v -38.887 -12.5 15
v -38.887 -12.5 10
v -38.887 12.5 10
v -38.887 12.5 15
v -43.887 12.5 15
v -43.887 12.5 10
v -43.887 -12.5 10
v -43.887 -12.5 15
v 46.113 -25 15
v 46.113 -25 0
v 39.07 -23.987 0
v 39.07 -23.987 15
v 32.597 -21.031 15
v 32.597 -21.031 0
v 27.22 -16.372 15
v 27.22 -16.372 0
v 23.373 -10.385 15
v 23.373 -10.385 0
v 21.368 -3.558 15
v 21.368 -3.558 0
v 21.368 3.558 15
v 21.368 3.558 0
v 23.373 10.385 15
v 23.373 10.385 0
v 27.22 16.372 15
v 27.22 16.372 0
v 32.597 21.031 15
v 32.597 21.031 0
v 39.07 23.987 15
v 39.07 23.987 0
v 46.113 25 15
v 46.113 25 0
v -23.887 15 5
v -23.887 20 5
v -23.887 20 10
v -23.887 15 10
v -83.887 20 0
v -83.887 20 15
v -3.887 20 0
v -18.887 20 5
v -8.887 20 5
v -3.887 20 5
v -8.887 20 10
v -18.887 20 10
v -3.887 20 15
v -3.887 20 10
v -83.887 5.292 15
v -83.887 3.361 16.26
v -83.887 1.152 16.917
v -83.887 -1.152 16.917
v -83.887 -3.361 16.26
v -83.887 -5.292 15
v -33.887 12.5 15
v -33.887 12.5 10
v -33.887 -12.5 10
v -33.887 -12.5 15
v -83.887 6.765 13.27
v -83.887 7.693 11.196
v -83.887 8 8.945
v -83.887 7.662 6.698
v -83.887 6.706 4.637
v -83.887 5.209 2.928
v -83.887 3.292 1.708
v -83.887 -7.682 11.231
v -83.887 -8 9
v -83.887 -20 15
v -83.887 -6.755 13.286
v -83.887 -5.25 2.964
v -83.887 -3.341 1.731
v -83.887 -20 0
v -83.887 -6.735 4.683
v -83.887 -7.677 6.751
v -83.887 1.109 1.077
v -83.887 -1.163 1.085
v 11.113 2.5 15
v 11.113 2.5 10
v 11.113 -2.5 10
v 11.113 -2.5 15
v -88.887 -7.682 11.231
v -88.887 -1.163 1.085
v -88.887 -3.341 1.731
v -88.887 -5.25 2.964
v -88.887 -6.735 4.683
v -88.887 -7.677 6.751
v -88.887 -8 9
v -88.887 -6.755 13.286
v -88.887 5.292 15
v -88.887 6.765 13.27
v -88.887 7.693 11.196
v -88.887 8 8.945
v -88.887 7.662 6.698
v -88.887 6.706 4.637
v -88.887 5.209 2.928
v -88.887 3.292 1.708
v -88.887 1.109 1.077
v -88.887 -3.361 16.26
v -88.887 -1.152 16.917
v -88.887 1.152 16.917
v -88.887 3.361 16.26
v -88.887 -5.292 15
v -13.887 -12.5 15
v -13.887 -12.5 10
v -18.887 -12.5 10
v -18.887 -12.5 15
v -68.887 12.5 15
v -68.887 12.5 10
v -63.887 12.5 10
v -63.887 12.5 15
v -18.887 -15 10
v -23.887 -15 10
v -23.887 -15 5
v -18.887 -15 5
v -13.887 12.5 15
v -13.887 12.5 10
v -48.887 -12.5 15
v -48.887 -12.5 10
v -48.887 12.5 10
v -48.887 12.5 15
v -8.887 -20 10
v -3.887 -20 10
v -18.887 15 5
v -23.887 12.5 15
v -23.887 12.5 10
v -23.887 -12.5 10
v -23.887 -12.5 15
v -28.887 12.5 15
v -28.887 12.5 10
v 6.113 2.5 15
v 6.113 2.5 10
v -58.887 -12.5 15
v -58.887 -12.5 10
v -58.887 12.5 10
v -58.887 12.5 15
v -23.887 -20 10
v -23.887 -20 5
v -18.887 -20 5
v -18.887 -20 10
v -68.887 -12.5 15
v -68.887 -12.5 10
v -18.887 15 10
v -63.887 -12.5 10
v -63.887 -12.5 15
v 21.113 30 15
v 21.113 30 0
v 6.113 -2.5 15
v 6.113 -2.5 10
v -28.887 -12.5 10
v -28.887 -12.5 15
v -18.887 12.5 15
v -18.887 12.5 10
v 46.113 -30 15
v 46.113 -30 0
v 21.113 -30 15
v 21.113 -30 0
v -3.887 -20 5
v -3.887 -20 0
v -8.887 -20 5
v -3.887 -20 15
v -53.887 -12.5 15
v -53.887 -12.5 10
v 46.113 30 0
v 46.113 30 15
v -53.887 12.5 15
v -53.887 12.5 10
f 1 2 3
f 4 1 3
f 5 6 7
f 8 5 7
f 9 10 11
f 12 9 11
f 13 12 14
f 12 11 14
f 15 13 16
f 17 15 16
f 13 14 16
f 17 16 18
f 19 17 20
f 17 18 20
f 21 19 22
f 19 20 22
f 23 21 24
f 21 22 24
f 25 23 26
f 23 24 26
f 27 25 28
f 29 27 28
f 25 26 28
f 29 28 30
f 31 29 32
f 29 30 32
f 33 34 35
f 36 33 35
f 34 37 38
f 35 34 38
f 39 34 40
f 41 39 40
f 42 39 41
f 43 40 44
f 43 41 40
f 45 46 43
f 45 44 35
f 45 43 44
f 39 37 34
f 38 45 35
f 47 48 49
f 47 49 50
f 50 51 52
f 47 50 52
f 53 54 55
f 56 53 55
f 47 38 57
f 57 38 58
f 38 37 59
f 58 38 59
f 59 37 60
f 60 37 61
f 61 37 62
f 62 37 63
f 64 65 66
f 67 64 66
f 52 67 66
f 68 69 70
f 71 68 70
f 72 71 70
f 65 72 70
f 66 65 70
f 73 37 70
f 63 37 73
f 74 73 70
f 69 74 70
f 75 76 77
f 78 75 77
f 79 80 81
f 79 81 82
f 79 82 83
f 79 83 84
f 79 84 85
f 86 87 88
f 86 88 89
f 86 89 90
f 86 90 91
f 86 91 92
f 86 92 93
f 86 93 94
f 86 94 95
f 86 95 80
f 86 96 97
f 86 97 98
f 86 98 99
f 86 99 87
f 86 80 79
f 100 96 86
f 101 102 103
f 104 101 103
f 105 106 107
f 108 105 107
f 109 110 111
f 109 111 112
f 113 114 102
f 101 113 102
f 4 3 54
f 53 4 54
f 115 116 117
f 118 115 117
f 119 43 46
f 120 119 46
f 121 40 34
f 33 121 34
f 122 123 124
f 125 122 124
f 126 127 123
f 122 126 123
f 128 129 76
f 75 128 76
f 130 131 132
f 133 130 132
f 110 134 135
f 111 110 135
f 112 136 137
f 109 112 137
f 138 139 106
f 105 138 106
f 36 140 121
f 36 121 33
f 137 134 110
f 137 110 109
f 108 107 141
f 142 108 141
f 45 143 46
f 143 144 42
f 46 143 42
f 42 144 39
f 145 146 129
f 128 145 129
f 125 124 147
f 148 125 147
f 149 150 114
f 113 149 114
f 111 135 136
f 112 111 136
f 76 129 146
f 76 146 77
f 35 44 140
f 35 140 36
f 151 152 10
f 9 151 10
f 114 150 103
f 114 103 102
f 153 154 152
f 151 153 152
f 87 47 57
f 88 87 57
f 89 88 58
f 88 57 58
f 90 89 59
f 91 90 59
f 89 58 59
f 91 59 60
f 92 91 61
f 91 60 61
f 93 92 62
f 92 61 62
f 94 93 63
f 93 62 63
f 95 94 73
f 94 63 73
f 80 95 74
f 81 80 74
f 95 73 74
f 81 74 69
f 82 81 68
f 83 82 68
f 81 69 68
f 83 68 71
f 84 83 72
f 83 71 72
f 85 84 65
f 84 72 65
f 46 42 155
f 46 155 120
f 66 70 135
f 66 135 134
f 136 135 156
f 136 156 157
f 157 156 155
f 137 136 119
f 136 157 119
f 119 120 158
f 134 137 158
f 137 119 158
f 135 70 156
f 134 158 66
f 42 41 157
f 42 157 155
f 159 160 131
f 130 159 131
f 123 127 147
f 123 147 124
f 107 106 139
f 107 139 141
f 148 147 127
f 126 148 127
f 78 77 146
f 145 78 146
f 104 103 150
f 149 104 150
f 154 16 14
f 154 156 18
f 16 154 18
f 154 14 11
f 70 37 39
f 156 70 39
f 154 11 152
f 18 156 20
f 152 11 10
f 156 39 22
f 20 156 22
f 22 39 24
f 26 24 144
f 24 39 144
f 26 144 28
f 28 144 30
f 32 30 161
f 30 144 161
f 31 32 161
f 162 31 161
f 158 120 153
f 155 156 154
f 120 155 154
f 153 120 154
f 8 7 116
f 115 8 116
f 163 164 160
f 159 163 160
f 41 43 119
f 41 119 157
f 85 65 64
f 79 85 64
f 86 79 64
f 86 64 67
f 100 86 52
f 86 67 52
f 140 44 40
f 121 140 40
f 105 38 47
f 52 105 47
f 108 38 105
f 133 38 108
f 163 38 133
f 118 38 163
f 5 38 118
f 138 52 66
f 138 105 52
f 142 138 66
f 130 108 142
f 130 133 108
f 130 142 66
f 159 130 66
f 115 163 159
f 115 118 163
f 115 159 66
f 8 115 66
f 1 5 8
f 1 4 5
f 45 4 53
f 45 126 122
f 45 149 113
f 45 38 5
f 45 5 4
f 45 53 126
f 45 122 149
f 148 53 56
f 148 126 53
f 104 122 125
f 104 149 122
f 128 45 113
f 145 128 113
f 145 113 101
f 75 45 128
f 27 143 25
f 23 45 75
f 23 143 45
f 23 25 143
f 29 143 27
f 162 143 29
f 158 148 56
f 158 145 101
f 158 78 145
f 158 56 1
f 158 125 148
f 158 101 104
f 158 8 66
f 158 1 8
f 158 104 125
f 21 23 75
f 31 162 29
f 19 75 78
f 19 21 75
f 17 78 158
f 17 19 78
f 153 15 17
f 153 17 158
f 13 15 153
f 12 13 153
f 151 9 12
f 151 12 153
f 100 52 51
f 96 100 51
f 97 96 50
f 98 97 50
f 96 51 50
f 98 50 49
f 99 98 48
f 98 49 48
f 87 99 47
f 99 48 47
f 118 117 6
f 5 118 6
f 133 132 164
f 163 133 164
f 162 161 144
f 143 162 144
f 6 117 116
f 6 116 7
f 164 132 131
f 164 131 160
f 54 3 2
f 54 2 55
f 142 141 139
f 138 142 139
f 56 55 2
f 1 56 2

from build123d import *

# Parameters (mm, degrees)
F1_DEPTH  = 15
F2_DEPTH  = 12.5
F4_DEPTH  = 5
F5_W      = 5
F5_H      = 2.5
F6_DEPTH  = 50
F7_W      = 5
F7_H      = 2.5
F8_DEPTH  = 5
F9_W      = 5
F9_H      = 2.5
F10_DEPTH = 5
F11_DEPTH = 10


with BuildPart() as f1:
    # F0 (on Top) → F1 (new body)
    with BuildSketch(Plane.XY):
        with BuildLine():
            ThreePointArc((46.1134053767, -25), (21.1134053767, 0), (46.1134053767, 25))
            Line((46.1134053767, 25), (46.1134053767, 30))
            Line((46.1134053767, 30), (21.1134053767, 30))
            Line((21.1134053767, 30), (-3.8865946233, 20))
            Line((-3.8865946233, 20), (-71.3865946233, 20))
            Line((-71.3865946233, 20), (-71.3865946233, -20))
            Line((-71.3865946233, -20), (-3.8865946233, -20))
            Line((-3.8865946233, -20), (21.1134053767, -30))
            Line((21.1134053767, -30), (46.1134053767, -30))
            Line((46.1134053767, -30), (46.1134053767, -25))
        make_face()
        Polygon((-63.8865946233, 12.5), (-63.8865946233, 0), (-63.8865946233, -12.5), (-68.8865946233, -12.5), (-68.8865946233, 12.5), align=None, mode=Mode.SUBTRACT)
        Polygon((-53.8865946233, 12.5), (-53.8865946233, 0), (-53.8865946233, -12.5), (-58.8865946233, -12.5), (-58.8865946233, 12.5), align=None, mode=Mode.SUBTRACT)
        Polygon((-43.8865946233, 12.5), (-43.8865946233, 0), (-43.8865946233, -12.5), (-48.8865946233, -12.5), (-48.8865946233, 12.5), align=None, mode=Mode.SUBTRACT)
        Polygon((-33.8865946233, 12.5), (-33.8865946233, 0), (-33.8865946233, -12.5), (-38.8865946233, -12.5), (-38.8865946233, 12.5), align=None, mode=Mode.SUBTRACT)
        Polygon((-23.8865946233, 12.5), (-23.8865946233, 0), (-23.8865946233, -12.5), (-28.8865946233, -12.5), (-28.8865946233, 12.5), align=None, mode=Mode.SUBTRACT)
        Polygon((-13.8865946233, 12.5), (-13.8865946233, 0), (-13.8865946233, -12.5), (-18.8865946233, -12.5), (-18.8865946233, 12.5), align=None, mode=Mode.SUBTRACT)
        Polygon((11.1134053767, 2.5), (11.1134053767, 0), (11.1134053767, -2.5), (6.1134053767, -2.5), (6.1134053767, 2.5), align=None, mode=Mode.SUBTRACT)
    extrude(amount=F1_DEPTH)

    # F2 (add): a face of the model
    f2_faces = [f1.faces().sort_by_distance(p)[0] for p in [
        (-71.3865946233, 0, 7.5),
    ]]
    extrude(f2_faces, amount=F2_DEPTH)

    # F3 (on face) → F4 (join)
    with BuildSketch(Plane(origin=(-83.8865946233, 0, 0), x_dir=(0, -1, 0), z_dir=(-1, 0, 0))):
        with BuildLine():
            ThreePointArc((-5.2915026221, 15), (-3.2915026221, 1.7084973779), (8, 9))
            ThreePointArc((8, 9), (7.2915026221, 12.2915026221), (5.2915026221, 15))
            Line((5.2915026221, 15), (-5.2915026221, 15))
        make_face()
        with BuildLine():
            Line((-5.2915026221, 15), (5.2915026221, 15))
            ThreePointArc((5.2915026221, 15), (0, 17), (-5.2915026221, 15))
        make_face()
    extrude(amount=F4_DEPTH)

    # F5 (on face) → F6 (cut)
    with BuildSketch(Plane.XZ.offset(20)):
        with Locations((-6.3865946233, 6.25)):
            Rectangle(F5_W, F5_H)
        with Locations((-6.3865946233, 8.75)):
            Rectangle(F5_W, F5_H)
    extrude(amount=-F6_DEPTH, mode=Mode.SUBTRACT)

    # F7 (on face) → F8 (cut)
    with BuildSketch(Plane.XZ.offset(20)):
        with Locations((-21.3865946233, 8.75)):
            Rectangle(F7_W, F7_H)
        with Locations((-21.3865946233, 6.25)):
            Rectangle(F7_W, F7_H)
    extrude(amount=-F8_DEPTH, mode=Mode.SUBTRACT)

    # F9 (on face) → F10 (cut)
    with BuildSketch(Plane(origin=(0, 20, 0), x_dir=(-1, 0, 0), z_dir=(0, 1, 0))):
        with Locations((21.3865946233, 8.75)):
            Rectangle(F9_W, F9_H)
        with Locations((21.3865946233, 6.25)):
            Rectangle(F9_W, F9_H)
    extrude(amount=-F10_DEPTH, mode=Mode.SUBTRACT)

    # F0 (on Top) → F11 (join)
    with BuildSketch(Plane.XY):
        Polygon((-63.8865946233, -12.5), (-63.8865946233, 0), (-63.8865946233, 12.5), (-68.8865946233, 12.5), (-68.8865946233, -12.5), align=None)
        Polygon((-53.8865946233, -12.5), (-53.8865946233, 0), (-53.8865946233, 12.5), (-58.8865946233, 12.5), (-58.8865946233, -12.5), align=None)
        Polygon((-43.8865946233, -12.5), (-43.8865946233, 0), (-43.8865946233, 12.5), (-48.8865946233, 12.5), (-48.8865946233, -12.5), align=None)
        Polygon((-33.8865946233, -12.5), (-33.8865946233, 0), (-33.8865946233, 12.5), (-38.8865946233, 12.5), (-38.8865946233, -12.5), align=None)
        Polygon((-23.8865946233, -12.5), (-23.8865946233, 0), (-23.8865946233, 12.5), (-28.8865946233, 12.5), (-28.8865946233, -12.5), align=None)
        Polygon((-13.8865946233, -12.5), (-13.8865946233, 0), (-13.8865946233, 12.5), (-18.8865946233, 12.5), (-18.8865946233, -12.5), align=None)
        Polygon((11.1134053767, -2.5), (11.1134053767, 0), (11.1134053767, 2.5), (6.1134053767, 2.5), (6.1134053767, -2.5), align=None)
    extrude(amount=F11_DEPTH)


solid = f1.part
